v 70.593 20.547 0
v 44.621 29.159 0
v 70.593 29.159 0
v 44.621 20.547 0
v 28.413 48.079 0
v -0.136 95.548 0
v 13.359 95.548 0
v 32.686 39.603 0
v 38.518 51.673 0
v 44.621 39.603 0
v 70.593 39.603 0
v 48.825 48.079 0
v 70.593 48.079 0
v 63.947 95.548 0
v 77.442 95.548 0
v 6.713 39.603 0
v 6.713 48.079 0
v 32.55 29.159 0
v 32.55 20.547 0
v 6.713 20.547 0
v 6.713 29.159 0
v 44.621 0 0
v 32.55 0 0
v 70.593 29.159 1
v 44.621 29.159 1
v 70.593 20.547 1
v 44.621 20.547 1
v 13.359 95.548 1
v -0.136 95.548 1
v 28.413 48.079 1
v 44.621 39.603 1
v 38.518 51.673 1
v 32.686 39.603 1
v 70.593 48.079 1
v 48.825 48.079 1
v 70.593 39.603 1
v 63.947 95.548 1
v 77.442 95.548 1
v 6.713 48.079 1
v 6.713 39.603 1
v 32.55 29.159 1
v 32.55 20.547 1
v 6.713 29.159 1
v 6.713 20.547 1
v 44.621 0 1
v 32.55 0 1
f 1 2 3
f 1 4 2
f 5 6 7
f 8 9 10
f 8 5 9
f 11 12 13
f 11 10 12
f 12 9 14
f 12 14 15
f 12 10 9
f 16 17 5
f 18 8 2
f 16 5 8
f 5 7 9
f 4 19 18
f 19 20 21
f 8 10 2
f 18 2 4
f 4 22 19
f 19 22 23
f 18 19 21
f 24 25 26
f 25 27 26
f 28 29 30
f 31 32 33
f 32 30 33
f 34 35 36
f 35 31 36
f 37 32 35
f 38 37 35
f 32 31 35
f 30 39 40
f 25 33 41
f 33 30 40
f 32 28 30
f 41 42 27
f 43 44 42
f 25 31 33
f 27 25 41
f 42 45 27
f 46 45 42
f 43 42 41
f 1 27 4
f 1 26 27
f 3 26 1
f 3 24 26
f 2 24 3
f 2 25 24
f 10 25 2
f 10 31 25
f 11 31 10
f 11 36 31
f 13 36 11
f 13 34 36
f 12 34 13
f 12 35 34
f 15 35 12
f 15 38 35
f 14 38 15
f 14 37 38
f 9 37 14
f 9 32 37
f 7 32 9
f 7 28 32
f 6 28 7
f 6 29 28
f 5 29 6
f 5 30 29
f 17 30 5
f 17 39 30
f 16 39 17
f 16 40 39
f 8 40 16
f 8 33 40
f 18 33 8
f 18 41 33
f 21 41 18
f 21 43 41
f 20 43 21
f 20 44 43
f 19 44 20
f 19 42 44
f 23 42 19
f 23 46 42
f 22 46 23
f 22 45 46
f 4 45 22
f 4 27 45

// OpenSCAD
module yen(size,thickness) {
    linear_extrude(thickness) {
        text(text="¥", size=size);
    }
}

yen(100, 1);
